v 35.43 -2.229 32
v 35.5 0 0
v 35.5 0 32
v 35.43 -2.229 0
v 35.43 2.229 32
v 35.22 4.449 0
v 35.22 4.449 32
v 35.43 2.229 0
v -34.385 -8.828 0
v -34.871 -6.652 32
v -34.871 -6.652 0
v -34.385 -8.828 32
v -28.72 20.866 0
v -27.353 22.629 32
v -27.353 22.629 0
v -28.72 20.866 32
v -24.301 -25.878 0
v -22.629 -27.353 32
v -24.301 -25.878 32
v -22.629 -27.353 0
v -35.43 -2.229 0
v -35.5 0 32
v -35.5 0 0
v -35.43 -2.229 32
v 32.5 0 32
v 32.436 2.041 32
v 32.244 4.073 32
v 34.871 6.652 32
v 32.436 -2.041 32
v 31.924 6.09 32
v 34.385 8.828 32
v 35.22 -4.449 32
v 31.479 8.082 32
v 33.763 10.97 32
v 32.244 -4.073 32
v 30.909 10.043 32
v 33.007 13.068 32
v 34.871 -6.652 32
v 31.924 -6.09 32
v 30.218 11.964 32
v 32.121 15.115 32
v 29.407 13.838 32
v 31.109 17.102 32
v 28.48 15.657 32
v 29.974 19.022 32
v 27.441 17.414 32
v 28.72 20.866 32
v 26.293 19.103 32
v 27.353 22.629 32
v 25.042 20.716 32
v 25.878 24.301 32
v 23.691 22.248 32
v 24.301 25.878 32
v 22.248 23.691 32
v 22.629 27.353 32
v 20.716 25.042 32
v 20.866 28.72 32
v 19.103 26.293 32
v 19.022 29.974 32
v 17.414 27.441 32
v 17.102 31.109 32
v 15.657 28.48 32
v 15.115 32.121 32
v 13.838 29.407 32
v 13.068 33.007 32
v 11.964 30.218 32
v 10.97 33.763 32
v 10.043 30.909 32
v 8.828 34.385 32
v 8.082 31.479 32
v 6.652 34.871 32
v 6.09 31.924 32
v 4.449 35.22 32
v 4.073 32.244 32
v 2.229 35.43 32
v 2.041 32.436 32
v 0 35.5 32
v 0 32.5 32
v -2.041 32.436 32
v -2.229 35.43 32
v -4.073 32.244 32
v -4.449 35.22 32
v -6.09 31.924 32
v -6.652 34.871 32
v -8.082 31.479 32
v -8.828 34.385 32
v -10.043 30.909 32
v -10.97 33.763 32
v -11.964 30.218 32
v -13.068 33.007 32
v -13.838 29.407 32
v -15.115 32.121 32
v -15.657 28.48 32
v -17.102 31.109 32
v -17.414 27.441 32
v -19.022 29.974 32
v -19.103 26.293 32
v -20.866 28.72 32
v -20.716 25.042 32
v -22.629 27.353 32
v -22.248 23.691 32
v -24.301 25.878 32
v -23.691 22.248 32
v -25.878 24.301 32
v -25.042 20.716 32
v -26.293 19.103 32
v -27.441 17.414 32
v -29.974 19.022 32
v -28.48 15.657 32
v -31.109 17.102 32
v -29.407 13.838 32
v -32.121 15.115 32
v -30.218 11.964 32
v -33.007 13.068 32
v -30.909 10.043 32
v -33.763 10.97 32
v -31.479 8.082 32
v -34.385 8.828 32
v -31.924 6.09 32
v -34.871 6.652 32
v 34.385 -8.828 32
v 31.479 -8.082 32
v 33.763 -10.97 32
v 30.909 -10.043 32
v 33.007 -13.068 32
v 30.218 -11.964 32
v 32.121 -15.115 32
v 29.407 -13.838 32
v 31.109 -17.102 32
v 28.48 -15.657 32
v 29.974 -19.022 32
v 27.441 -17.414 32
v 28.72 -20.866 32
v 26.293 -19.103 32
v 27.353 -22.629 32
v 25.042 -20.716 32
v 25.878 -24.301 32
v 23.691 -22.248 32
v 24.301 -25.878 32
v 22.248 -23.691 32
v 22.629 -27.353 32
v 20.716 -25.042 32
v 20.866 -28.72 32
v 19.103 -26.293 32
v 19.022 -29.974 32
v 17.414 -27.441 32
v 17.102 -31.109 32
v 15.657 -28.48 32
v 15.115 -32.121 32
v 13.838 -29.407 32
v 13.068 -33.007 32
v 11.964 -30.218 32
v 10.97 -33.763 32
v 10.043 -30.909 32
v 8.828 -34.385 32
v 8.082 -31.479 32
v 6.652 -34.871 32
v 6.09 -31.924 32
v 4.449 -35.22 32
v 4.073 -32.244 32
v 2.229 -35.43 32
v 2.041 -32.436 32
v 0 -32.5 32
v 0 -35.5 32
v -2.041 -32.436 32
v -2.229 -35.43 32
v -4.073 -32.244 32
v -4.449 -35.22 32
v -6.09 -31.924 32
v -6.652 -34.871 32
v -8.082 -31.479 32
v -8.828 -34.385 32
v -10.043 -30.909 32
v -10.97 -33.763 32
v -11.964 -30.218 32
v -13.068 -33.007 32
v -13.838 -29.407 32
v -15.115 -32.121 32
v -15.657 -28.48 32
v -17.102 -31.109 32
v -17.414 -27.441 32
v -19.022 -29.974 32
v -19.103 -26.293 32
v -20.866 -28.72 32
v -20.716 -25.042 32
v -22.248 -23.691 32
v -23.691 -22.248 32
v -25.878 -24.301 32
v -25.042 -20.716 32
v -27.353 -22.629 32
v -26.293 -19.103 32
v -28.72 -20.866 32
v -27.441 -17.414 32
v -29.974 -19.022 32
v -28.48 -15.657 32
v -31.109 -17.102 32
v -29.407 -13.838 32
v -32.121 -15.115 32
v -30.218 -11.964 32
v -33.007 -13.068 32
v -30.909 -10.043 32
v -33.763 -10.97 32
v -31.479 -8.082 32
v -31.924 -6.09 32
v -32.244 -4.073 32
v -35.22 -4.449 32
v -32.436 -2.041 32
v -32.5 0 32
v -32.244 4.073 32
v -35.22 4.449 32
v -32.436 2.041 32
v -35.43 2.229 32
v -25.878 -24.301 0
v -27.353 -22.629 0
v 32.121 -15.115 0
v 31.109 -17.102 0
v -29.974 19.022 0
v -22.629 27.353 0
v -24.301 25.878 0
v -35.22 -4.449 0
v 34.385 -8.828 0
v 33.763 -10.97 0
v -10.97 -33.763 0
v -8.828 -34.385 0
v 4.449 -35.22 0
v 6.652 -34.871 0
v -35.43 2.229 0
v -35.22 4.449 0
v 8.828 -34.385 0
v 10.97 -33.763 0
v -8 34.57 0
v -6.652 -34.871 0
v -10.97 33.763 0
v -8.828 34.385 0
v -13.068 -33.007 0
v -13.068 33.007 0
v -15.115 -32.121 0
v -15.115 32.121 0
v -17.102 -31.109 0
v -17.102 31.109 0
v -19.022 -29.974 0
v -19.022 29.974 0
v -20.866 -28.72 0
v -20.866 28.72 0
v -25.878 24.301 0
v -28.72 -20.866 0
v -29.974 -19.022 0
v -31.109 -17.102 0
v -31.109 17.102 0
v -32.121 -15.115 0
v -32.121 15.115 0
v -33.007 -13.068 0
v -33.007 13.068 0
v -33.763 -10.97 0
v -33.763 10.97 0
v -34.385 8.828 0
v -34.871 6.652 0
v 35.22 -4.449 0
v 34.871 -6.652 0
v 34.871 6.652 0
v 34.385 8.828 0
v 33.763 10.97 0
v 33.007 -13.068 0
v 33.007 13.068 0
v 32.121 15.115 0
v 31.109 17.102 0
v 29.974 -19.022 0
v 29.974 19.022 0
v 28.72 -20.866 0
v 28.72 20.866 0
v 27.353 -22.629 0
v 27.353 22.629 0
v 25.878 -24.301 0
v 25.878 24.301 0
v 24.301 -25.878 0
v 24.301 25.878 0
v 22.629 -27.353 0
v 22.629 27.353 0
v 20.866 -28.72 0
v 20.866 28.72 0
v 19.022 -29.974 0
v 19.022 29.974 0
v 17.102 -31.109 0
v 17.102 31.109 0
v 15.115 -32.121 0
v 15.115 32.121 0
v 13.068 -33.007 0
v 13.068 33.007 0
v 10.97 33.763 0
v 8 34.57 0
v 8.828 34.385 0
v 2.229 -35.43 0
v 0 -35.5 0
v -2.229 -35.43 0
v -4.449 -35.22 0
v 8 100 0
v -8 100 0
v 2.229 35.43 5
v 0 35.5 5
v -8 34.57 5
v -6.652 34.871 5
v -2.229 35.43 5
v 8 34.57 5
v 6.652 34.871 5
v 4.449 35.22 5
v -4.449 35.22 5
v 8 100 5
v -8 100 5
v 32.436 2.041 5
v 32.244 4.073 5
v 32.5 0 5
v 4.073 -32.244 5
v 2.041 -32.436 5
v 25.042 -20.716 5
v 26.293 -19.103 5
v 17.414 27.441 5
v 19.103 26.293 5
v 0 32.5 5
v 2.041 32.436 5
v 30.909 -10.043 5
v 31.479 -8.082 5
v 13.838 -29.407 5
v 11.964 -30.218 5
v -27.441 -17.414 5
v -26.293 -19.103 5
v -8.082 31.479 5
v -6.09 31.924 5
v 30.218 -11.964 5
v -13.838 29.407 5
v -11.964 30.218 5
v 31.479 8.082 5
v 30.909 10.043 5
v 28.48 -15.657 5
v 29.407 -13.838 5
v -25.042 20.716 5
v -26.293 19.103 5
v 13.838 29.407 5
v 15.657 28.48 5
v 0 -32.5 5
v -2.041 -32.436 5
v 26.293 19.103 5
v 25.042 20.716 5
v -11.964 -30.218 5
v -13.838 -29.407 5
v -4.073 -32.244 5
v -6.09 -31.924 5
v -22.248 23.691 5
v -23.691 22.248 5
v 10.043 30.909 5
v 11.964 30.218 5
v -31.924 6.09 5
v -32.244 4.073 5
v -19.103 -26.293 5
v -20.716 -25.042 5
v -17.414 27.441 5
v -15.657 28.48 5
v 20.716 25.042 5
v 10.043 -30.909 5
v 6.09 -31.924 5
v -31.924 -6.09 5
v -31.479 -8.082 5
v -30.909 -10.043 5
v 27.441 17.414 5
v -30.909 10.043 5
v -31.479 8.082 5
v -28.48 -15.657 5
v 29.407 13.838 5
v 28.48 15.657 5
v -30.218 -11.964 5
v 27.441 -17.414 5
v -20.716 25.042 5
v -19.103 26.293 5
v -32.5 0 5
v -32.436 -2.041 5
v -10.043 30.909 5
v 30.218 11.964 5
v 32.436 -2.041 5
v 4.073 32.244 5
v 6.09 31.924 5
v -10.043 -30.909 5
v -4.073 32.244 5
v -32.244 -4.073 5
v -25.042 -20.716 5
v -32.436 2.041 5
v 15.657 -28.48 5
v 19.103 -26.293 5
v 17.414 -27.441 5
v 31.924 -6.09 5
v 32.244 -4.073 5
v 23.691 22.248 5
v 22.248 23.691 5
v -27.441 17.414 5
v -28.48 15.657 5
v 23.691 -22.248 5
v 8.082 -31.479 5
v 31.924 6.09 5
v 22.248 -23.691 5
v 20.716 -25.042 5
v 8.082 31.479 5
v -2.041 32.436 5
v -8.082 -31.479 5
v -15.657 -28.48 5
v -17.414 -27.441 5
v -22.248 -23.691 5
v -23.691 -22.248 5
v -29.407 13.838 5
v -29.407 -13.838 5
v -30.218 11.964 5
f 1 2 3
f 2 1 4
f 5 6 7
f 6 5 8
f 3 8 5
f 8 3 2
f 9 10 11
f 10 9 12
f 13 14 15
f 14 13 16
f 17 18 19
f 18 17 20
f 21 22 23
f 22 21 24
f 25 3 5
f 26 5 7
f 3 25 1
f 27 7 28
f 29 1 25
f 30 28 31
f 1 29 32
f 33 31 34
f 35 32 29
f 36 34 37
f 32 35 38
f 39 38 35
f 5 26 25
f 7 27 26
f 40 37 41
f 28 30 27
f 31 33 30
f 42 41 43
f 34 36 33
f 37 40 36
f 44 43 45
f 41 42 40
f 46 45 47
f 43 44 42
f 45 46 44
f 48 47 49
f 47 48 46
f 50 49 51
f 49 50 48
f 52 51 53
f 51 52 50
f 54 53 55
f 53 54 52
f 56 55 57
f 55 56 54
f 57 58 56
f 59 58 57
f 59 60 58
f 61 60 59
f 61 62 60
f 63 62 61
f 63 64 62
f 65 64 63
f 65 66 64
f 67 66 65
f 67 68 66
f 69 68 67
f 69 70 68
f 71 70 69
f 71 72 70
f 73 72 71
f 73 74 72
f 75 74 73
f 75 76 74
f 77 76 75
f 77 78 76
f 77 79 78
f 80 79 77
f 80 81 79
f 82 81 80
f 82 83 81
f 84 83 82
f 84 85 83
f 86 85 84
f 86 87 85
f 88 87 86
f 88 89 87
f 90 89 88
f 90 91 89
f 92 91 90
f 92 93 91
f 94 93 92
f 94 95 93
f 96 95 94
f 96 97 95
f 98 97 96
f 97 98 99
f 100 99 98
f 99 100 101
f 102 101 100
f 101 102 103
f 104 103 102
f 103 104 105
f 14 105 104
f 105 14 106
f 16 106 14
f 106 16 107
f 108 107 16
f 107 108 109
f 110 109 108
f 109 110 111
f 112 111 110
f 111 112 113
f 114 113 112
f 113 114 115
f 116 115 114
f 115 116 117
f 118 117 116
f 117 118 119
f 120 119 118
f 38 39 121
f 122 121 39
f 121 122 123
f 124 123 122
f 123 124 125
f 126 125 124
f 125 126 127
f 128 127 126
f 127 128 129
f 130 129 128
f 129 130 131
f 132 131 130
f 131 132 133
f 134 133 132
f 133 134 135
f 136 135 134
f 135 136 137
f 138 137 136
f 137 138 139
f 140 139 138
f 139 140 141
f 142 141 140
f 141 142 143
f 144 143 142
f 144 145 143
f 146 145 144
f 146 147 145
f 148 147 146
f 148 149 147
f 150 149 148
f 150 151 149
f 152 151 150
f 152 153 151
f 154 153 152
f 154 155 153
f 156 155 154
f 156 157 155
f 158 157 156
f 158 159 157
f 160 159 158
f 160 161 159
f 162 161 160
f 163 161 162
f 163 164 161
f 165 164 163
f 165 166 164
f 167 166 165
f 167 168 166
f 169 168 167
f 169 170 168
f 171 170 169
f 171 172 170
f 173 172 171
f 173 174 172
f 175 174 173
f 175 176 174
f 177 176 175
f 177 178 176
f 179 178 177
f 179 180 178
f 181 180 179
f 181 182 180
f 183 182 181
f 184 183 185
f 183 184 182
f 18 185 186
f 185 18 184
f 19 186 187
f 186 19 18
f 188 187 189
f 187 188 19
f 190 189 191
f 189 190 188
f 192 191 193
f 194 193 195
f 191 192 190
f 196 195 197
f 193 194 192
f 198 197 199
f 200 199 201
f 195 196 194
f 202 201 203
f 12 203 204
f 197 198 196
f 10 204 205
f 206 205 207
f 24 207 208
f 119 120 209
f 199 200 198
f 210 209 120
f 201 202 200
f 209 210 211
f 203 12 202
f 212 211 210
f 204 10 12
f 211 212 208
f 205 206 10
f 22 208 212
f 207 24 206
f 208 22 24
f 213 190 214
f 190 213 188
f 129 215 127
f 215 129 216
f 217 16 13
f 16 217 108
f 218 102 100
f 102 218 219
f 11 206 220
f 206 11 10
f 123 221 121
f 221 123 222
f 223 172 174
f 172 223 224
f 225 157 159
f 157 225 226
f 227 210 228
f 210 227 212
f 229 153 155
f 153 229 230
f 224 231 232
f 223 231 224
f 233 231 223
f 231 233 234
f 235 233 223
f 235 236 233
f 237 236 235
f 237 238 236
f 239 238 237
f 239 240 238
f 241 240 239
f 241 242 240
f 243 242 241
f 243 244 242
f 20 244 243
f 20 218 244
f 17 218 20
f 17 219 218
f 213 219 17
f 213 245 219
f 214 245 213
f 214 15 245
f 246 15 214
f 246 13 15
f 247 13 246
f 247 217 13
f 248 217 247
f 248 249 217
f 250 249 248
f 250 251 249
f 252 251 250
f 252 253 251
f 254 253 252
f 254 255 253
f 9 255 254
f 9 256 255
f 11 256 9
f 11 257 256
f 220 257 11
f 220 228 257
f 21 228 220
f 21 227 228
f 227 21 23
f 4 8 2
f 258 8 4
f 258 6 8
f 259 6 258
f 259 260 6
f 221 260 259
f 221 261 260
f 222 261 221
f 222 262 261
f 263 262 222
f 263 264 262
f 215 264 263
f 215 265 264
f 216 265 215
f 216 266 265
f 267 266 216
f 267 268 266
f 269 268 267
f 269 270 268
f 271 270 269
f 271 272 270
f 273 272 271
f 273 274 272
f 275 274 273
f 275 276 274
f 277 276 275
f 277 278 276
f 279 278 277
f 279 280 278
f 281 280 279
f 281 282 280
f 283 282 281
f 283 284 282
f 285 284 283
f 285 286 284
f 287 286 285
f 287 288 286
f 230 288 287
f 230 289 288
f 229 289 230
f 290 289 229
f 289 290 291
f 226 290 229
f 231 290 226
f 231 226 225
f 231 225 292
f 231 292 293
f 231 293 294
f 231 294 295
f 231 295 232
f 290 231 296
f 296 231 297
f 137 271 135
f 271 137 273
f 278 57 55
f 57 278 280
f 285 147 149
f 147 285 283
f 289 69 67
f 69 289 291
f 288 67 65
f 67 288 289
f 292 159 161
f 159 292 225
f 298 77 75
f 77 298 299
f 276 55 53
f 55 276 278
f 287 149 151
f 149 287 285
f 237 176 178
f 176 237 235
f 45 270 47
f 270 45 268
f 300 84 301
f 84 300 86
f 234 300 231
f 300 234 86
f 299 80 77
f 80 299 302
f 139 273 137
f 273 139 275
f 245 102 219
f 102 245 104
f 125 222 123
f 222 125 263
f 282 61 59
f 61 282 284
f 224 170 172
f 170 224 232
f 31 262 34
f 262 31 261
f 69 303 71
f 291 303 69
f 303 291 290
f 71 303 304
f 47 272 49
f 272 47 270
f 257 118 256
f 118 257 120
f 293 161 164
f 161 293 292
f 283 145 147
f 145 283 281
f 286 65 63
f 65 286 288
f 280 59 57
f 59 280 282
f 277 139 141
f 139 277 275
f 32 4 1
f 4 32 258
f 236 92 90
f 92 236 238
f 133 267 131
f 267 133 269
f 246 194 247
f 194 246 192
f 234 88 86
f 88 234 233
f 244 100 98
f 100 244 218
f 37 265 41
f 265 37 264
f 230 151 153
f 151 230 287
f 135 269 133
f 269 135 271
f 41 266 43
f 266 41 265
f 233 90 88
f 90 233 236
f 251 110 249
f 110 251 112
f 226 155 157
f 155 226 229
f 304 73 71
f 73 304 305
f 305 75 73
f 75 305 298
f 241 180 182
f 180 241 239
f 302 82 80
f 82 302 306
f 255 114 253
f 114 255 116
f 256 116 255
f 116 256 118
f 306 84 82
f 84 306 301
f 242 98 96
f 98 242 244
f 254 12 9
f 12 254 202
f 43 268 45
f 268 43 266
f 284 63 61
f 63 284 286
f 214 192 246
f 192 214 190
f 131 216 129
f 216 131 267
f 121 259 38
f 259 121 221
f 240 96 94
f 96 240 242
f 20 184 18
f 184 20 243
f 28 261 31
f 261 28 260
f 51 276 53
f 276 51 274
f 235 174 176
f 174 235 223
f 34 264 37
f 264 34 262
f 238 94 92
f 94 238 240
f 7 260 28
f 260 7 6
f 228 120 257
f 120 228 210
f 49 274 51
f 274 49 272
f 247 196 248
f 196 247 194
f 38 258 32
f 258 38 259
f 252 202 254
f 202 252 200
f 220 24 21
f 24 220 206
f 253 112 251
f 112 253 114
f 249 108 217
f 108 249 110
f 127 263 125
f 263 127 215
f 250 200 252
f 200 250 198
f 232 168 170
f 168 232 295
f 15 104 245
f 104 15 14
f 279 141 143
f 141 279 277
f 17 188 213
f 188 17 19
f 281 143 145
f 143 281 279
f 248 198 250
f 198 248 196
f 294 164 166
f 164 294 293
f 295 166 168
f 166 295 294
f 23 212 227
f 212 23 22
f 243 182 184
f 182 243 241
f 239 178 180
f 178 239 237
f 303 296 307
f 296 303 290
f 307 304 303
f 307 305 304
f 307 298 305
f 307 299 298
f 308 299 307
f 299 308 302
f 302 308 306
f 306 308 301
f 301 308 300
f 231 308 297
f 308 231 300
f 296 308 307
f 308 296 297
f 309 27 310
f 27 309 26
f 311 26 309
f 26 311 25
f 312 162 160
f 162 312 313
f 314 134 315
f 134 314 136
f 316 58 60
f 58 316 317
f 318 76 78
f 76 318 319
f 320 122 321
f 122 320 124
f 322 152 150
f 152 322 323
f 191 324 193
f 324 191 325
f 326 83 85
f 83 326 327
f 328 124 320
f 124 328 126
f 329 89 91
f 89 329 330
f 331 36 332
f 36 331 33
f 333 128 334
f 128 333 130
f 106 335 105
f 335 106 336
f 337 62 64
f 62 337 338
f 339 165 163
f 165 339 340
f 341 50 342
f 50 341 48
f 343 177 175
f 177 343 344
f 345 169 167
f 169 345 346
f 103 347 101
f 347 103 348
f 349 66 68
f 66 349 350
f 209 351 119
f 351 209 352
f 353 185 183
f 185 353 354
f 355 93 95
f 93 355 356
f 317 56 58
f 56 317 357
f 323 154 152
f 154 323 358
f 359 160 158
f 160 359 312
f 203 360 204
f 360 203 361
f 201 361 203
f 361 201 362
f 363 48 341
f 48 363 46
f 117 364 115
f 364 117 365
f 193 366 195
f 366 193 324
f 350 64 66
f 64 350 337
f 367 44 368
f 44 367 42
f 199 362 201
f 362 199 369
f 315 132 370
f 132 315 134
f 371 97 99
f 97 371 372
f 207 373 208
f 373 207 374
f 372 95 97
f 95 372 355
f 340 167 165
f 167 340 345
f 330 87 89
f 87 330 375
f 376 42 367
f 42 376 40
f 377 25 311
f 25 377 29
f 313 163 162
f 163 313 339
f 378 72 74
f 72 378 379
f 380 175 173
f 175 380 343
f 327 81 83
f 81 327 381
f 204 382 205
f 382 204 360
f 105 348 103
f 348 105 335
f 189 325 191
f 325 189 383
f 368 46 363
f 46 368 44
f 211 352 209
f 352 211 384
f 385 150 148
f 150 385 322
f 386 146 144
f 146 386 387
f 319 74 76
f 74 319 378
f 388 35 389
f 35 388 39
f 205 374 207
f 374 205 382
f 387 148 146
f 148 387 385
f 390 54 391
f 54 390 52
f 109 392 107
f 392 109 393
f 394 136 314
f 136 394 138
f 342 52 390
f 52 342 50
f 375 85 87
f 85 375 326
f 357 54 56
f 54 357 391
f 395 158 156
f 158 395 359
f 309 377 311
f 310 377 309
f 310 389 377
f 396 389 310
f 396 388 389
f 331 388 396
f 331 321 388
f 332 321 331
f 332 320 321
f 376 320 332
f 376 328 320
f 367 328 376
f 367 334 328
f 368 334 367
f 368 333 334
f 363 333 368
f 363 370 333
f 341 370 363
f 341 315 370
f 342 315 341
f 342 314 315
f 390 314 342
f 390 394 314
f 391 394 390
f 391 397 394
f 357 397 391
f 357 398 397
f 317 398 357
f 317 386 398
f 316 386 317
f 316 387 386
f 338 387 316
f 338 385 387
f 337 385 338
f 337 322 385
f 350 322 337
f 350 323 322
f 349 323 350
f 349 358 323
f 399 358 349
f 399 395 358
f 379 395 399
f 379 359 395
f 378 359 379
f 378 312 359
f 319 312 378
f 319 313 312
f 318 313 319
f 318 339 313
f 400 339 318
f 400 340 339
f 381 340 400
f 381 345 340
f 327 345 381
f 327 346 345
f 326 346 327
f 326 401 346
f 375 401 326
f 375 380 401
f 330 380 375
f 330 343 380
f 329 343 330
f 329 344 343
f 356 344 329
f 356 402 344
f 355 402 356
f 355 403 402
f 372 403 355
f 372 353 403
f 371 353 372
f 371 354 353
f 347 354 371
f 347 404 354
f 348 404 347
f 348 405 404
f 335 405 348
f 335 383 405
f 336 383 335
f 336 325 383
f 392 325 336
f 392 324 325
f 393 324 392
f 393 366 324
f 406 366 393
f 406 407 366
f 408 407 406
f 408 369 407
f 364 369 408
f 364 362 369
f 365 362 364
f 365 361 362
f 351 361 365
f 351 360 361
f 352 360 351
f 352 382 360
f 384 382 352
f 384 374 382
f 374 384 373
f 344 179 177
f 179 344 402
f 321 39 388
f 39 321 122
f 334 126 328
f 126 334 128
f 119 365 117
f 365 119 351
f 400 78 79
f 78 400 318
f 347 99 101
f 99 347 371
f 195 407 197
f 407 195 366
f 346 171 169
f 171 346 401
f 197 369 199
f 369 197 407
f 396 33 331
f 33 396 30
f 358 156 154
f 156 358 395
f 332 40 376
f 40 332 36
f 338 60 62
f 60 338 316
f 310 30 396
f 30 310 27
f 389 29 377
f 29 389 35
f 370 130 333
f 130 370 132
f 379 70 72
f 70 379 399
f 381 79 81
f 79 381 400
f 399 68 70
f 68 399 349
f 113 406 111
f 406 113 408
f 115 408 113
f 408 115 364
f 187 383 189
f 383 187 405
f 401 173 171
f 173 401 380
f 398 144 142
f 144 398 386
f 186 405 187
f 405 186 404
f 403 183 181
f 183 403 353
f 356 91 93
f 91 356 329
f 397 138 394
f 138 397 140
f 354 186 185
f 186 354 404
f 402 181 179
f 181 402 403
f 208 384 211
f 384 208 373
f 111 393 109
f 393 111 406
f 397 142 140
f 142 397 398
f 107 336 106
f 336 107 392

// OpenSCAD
difference(){
	union(){ 

        translate([0,0,0]){
            rotate(a = [0,0,0]) {
                cylinder(h=32, r=65/2+3, $fn=100, center=false);
            }
        }	
        translate([-8,0,0]){
           cube([16,100,5], center=false);
        }
        

	}
	union() {
        translate([0,0,5]){
            rotate(a = [0,0,0]) {
                cylinder(h=30, r=65/2, $fn=100, center=false);
            }
        }	


	}
}
